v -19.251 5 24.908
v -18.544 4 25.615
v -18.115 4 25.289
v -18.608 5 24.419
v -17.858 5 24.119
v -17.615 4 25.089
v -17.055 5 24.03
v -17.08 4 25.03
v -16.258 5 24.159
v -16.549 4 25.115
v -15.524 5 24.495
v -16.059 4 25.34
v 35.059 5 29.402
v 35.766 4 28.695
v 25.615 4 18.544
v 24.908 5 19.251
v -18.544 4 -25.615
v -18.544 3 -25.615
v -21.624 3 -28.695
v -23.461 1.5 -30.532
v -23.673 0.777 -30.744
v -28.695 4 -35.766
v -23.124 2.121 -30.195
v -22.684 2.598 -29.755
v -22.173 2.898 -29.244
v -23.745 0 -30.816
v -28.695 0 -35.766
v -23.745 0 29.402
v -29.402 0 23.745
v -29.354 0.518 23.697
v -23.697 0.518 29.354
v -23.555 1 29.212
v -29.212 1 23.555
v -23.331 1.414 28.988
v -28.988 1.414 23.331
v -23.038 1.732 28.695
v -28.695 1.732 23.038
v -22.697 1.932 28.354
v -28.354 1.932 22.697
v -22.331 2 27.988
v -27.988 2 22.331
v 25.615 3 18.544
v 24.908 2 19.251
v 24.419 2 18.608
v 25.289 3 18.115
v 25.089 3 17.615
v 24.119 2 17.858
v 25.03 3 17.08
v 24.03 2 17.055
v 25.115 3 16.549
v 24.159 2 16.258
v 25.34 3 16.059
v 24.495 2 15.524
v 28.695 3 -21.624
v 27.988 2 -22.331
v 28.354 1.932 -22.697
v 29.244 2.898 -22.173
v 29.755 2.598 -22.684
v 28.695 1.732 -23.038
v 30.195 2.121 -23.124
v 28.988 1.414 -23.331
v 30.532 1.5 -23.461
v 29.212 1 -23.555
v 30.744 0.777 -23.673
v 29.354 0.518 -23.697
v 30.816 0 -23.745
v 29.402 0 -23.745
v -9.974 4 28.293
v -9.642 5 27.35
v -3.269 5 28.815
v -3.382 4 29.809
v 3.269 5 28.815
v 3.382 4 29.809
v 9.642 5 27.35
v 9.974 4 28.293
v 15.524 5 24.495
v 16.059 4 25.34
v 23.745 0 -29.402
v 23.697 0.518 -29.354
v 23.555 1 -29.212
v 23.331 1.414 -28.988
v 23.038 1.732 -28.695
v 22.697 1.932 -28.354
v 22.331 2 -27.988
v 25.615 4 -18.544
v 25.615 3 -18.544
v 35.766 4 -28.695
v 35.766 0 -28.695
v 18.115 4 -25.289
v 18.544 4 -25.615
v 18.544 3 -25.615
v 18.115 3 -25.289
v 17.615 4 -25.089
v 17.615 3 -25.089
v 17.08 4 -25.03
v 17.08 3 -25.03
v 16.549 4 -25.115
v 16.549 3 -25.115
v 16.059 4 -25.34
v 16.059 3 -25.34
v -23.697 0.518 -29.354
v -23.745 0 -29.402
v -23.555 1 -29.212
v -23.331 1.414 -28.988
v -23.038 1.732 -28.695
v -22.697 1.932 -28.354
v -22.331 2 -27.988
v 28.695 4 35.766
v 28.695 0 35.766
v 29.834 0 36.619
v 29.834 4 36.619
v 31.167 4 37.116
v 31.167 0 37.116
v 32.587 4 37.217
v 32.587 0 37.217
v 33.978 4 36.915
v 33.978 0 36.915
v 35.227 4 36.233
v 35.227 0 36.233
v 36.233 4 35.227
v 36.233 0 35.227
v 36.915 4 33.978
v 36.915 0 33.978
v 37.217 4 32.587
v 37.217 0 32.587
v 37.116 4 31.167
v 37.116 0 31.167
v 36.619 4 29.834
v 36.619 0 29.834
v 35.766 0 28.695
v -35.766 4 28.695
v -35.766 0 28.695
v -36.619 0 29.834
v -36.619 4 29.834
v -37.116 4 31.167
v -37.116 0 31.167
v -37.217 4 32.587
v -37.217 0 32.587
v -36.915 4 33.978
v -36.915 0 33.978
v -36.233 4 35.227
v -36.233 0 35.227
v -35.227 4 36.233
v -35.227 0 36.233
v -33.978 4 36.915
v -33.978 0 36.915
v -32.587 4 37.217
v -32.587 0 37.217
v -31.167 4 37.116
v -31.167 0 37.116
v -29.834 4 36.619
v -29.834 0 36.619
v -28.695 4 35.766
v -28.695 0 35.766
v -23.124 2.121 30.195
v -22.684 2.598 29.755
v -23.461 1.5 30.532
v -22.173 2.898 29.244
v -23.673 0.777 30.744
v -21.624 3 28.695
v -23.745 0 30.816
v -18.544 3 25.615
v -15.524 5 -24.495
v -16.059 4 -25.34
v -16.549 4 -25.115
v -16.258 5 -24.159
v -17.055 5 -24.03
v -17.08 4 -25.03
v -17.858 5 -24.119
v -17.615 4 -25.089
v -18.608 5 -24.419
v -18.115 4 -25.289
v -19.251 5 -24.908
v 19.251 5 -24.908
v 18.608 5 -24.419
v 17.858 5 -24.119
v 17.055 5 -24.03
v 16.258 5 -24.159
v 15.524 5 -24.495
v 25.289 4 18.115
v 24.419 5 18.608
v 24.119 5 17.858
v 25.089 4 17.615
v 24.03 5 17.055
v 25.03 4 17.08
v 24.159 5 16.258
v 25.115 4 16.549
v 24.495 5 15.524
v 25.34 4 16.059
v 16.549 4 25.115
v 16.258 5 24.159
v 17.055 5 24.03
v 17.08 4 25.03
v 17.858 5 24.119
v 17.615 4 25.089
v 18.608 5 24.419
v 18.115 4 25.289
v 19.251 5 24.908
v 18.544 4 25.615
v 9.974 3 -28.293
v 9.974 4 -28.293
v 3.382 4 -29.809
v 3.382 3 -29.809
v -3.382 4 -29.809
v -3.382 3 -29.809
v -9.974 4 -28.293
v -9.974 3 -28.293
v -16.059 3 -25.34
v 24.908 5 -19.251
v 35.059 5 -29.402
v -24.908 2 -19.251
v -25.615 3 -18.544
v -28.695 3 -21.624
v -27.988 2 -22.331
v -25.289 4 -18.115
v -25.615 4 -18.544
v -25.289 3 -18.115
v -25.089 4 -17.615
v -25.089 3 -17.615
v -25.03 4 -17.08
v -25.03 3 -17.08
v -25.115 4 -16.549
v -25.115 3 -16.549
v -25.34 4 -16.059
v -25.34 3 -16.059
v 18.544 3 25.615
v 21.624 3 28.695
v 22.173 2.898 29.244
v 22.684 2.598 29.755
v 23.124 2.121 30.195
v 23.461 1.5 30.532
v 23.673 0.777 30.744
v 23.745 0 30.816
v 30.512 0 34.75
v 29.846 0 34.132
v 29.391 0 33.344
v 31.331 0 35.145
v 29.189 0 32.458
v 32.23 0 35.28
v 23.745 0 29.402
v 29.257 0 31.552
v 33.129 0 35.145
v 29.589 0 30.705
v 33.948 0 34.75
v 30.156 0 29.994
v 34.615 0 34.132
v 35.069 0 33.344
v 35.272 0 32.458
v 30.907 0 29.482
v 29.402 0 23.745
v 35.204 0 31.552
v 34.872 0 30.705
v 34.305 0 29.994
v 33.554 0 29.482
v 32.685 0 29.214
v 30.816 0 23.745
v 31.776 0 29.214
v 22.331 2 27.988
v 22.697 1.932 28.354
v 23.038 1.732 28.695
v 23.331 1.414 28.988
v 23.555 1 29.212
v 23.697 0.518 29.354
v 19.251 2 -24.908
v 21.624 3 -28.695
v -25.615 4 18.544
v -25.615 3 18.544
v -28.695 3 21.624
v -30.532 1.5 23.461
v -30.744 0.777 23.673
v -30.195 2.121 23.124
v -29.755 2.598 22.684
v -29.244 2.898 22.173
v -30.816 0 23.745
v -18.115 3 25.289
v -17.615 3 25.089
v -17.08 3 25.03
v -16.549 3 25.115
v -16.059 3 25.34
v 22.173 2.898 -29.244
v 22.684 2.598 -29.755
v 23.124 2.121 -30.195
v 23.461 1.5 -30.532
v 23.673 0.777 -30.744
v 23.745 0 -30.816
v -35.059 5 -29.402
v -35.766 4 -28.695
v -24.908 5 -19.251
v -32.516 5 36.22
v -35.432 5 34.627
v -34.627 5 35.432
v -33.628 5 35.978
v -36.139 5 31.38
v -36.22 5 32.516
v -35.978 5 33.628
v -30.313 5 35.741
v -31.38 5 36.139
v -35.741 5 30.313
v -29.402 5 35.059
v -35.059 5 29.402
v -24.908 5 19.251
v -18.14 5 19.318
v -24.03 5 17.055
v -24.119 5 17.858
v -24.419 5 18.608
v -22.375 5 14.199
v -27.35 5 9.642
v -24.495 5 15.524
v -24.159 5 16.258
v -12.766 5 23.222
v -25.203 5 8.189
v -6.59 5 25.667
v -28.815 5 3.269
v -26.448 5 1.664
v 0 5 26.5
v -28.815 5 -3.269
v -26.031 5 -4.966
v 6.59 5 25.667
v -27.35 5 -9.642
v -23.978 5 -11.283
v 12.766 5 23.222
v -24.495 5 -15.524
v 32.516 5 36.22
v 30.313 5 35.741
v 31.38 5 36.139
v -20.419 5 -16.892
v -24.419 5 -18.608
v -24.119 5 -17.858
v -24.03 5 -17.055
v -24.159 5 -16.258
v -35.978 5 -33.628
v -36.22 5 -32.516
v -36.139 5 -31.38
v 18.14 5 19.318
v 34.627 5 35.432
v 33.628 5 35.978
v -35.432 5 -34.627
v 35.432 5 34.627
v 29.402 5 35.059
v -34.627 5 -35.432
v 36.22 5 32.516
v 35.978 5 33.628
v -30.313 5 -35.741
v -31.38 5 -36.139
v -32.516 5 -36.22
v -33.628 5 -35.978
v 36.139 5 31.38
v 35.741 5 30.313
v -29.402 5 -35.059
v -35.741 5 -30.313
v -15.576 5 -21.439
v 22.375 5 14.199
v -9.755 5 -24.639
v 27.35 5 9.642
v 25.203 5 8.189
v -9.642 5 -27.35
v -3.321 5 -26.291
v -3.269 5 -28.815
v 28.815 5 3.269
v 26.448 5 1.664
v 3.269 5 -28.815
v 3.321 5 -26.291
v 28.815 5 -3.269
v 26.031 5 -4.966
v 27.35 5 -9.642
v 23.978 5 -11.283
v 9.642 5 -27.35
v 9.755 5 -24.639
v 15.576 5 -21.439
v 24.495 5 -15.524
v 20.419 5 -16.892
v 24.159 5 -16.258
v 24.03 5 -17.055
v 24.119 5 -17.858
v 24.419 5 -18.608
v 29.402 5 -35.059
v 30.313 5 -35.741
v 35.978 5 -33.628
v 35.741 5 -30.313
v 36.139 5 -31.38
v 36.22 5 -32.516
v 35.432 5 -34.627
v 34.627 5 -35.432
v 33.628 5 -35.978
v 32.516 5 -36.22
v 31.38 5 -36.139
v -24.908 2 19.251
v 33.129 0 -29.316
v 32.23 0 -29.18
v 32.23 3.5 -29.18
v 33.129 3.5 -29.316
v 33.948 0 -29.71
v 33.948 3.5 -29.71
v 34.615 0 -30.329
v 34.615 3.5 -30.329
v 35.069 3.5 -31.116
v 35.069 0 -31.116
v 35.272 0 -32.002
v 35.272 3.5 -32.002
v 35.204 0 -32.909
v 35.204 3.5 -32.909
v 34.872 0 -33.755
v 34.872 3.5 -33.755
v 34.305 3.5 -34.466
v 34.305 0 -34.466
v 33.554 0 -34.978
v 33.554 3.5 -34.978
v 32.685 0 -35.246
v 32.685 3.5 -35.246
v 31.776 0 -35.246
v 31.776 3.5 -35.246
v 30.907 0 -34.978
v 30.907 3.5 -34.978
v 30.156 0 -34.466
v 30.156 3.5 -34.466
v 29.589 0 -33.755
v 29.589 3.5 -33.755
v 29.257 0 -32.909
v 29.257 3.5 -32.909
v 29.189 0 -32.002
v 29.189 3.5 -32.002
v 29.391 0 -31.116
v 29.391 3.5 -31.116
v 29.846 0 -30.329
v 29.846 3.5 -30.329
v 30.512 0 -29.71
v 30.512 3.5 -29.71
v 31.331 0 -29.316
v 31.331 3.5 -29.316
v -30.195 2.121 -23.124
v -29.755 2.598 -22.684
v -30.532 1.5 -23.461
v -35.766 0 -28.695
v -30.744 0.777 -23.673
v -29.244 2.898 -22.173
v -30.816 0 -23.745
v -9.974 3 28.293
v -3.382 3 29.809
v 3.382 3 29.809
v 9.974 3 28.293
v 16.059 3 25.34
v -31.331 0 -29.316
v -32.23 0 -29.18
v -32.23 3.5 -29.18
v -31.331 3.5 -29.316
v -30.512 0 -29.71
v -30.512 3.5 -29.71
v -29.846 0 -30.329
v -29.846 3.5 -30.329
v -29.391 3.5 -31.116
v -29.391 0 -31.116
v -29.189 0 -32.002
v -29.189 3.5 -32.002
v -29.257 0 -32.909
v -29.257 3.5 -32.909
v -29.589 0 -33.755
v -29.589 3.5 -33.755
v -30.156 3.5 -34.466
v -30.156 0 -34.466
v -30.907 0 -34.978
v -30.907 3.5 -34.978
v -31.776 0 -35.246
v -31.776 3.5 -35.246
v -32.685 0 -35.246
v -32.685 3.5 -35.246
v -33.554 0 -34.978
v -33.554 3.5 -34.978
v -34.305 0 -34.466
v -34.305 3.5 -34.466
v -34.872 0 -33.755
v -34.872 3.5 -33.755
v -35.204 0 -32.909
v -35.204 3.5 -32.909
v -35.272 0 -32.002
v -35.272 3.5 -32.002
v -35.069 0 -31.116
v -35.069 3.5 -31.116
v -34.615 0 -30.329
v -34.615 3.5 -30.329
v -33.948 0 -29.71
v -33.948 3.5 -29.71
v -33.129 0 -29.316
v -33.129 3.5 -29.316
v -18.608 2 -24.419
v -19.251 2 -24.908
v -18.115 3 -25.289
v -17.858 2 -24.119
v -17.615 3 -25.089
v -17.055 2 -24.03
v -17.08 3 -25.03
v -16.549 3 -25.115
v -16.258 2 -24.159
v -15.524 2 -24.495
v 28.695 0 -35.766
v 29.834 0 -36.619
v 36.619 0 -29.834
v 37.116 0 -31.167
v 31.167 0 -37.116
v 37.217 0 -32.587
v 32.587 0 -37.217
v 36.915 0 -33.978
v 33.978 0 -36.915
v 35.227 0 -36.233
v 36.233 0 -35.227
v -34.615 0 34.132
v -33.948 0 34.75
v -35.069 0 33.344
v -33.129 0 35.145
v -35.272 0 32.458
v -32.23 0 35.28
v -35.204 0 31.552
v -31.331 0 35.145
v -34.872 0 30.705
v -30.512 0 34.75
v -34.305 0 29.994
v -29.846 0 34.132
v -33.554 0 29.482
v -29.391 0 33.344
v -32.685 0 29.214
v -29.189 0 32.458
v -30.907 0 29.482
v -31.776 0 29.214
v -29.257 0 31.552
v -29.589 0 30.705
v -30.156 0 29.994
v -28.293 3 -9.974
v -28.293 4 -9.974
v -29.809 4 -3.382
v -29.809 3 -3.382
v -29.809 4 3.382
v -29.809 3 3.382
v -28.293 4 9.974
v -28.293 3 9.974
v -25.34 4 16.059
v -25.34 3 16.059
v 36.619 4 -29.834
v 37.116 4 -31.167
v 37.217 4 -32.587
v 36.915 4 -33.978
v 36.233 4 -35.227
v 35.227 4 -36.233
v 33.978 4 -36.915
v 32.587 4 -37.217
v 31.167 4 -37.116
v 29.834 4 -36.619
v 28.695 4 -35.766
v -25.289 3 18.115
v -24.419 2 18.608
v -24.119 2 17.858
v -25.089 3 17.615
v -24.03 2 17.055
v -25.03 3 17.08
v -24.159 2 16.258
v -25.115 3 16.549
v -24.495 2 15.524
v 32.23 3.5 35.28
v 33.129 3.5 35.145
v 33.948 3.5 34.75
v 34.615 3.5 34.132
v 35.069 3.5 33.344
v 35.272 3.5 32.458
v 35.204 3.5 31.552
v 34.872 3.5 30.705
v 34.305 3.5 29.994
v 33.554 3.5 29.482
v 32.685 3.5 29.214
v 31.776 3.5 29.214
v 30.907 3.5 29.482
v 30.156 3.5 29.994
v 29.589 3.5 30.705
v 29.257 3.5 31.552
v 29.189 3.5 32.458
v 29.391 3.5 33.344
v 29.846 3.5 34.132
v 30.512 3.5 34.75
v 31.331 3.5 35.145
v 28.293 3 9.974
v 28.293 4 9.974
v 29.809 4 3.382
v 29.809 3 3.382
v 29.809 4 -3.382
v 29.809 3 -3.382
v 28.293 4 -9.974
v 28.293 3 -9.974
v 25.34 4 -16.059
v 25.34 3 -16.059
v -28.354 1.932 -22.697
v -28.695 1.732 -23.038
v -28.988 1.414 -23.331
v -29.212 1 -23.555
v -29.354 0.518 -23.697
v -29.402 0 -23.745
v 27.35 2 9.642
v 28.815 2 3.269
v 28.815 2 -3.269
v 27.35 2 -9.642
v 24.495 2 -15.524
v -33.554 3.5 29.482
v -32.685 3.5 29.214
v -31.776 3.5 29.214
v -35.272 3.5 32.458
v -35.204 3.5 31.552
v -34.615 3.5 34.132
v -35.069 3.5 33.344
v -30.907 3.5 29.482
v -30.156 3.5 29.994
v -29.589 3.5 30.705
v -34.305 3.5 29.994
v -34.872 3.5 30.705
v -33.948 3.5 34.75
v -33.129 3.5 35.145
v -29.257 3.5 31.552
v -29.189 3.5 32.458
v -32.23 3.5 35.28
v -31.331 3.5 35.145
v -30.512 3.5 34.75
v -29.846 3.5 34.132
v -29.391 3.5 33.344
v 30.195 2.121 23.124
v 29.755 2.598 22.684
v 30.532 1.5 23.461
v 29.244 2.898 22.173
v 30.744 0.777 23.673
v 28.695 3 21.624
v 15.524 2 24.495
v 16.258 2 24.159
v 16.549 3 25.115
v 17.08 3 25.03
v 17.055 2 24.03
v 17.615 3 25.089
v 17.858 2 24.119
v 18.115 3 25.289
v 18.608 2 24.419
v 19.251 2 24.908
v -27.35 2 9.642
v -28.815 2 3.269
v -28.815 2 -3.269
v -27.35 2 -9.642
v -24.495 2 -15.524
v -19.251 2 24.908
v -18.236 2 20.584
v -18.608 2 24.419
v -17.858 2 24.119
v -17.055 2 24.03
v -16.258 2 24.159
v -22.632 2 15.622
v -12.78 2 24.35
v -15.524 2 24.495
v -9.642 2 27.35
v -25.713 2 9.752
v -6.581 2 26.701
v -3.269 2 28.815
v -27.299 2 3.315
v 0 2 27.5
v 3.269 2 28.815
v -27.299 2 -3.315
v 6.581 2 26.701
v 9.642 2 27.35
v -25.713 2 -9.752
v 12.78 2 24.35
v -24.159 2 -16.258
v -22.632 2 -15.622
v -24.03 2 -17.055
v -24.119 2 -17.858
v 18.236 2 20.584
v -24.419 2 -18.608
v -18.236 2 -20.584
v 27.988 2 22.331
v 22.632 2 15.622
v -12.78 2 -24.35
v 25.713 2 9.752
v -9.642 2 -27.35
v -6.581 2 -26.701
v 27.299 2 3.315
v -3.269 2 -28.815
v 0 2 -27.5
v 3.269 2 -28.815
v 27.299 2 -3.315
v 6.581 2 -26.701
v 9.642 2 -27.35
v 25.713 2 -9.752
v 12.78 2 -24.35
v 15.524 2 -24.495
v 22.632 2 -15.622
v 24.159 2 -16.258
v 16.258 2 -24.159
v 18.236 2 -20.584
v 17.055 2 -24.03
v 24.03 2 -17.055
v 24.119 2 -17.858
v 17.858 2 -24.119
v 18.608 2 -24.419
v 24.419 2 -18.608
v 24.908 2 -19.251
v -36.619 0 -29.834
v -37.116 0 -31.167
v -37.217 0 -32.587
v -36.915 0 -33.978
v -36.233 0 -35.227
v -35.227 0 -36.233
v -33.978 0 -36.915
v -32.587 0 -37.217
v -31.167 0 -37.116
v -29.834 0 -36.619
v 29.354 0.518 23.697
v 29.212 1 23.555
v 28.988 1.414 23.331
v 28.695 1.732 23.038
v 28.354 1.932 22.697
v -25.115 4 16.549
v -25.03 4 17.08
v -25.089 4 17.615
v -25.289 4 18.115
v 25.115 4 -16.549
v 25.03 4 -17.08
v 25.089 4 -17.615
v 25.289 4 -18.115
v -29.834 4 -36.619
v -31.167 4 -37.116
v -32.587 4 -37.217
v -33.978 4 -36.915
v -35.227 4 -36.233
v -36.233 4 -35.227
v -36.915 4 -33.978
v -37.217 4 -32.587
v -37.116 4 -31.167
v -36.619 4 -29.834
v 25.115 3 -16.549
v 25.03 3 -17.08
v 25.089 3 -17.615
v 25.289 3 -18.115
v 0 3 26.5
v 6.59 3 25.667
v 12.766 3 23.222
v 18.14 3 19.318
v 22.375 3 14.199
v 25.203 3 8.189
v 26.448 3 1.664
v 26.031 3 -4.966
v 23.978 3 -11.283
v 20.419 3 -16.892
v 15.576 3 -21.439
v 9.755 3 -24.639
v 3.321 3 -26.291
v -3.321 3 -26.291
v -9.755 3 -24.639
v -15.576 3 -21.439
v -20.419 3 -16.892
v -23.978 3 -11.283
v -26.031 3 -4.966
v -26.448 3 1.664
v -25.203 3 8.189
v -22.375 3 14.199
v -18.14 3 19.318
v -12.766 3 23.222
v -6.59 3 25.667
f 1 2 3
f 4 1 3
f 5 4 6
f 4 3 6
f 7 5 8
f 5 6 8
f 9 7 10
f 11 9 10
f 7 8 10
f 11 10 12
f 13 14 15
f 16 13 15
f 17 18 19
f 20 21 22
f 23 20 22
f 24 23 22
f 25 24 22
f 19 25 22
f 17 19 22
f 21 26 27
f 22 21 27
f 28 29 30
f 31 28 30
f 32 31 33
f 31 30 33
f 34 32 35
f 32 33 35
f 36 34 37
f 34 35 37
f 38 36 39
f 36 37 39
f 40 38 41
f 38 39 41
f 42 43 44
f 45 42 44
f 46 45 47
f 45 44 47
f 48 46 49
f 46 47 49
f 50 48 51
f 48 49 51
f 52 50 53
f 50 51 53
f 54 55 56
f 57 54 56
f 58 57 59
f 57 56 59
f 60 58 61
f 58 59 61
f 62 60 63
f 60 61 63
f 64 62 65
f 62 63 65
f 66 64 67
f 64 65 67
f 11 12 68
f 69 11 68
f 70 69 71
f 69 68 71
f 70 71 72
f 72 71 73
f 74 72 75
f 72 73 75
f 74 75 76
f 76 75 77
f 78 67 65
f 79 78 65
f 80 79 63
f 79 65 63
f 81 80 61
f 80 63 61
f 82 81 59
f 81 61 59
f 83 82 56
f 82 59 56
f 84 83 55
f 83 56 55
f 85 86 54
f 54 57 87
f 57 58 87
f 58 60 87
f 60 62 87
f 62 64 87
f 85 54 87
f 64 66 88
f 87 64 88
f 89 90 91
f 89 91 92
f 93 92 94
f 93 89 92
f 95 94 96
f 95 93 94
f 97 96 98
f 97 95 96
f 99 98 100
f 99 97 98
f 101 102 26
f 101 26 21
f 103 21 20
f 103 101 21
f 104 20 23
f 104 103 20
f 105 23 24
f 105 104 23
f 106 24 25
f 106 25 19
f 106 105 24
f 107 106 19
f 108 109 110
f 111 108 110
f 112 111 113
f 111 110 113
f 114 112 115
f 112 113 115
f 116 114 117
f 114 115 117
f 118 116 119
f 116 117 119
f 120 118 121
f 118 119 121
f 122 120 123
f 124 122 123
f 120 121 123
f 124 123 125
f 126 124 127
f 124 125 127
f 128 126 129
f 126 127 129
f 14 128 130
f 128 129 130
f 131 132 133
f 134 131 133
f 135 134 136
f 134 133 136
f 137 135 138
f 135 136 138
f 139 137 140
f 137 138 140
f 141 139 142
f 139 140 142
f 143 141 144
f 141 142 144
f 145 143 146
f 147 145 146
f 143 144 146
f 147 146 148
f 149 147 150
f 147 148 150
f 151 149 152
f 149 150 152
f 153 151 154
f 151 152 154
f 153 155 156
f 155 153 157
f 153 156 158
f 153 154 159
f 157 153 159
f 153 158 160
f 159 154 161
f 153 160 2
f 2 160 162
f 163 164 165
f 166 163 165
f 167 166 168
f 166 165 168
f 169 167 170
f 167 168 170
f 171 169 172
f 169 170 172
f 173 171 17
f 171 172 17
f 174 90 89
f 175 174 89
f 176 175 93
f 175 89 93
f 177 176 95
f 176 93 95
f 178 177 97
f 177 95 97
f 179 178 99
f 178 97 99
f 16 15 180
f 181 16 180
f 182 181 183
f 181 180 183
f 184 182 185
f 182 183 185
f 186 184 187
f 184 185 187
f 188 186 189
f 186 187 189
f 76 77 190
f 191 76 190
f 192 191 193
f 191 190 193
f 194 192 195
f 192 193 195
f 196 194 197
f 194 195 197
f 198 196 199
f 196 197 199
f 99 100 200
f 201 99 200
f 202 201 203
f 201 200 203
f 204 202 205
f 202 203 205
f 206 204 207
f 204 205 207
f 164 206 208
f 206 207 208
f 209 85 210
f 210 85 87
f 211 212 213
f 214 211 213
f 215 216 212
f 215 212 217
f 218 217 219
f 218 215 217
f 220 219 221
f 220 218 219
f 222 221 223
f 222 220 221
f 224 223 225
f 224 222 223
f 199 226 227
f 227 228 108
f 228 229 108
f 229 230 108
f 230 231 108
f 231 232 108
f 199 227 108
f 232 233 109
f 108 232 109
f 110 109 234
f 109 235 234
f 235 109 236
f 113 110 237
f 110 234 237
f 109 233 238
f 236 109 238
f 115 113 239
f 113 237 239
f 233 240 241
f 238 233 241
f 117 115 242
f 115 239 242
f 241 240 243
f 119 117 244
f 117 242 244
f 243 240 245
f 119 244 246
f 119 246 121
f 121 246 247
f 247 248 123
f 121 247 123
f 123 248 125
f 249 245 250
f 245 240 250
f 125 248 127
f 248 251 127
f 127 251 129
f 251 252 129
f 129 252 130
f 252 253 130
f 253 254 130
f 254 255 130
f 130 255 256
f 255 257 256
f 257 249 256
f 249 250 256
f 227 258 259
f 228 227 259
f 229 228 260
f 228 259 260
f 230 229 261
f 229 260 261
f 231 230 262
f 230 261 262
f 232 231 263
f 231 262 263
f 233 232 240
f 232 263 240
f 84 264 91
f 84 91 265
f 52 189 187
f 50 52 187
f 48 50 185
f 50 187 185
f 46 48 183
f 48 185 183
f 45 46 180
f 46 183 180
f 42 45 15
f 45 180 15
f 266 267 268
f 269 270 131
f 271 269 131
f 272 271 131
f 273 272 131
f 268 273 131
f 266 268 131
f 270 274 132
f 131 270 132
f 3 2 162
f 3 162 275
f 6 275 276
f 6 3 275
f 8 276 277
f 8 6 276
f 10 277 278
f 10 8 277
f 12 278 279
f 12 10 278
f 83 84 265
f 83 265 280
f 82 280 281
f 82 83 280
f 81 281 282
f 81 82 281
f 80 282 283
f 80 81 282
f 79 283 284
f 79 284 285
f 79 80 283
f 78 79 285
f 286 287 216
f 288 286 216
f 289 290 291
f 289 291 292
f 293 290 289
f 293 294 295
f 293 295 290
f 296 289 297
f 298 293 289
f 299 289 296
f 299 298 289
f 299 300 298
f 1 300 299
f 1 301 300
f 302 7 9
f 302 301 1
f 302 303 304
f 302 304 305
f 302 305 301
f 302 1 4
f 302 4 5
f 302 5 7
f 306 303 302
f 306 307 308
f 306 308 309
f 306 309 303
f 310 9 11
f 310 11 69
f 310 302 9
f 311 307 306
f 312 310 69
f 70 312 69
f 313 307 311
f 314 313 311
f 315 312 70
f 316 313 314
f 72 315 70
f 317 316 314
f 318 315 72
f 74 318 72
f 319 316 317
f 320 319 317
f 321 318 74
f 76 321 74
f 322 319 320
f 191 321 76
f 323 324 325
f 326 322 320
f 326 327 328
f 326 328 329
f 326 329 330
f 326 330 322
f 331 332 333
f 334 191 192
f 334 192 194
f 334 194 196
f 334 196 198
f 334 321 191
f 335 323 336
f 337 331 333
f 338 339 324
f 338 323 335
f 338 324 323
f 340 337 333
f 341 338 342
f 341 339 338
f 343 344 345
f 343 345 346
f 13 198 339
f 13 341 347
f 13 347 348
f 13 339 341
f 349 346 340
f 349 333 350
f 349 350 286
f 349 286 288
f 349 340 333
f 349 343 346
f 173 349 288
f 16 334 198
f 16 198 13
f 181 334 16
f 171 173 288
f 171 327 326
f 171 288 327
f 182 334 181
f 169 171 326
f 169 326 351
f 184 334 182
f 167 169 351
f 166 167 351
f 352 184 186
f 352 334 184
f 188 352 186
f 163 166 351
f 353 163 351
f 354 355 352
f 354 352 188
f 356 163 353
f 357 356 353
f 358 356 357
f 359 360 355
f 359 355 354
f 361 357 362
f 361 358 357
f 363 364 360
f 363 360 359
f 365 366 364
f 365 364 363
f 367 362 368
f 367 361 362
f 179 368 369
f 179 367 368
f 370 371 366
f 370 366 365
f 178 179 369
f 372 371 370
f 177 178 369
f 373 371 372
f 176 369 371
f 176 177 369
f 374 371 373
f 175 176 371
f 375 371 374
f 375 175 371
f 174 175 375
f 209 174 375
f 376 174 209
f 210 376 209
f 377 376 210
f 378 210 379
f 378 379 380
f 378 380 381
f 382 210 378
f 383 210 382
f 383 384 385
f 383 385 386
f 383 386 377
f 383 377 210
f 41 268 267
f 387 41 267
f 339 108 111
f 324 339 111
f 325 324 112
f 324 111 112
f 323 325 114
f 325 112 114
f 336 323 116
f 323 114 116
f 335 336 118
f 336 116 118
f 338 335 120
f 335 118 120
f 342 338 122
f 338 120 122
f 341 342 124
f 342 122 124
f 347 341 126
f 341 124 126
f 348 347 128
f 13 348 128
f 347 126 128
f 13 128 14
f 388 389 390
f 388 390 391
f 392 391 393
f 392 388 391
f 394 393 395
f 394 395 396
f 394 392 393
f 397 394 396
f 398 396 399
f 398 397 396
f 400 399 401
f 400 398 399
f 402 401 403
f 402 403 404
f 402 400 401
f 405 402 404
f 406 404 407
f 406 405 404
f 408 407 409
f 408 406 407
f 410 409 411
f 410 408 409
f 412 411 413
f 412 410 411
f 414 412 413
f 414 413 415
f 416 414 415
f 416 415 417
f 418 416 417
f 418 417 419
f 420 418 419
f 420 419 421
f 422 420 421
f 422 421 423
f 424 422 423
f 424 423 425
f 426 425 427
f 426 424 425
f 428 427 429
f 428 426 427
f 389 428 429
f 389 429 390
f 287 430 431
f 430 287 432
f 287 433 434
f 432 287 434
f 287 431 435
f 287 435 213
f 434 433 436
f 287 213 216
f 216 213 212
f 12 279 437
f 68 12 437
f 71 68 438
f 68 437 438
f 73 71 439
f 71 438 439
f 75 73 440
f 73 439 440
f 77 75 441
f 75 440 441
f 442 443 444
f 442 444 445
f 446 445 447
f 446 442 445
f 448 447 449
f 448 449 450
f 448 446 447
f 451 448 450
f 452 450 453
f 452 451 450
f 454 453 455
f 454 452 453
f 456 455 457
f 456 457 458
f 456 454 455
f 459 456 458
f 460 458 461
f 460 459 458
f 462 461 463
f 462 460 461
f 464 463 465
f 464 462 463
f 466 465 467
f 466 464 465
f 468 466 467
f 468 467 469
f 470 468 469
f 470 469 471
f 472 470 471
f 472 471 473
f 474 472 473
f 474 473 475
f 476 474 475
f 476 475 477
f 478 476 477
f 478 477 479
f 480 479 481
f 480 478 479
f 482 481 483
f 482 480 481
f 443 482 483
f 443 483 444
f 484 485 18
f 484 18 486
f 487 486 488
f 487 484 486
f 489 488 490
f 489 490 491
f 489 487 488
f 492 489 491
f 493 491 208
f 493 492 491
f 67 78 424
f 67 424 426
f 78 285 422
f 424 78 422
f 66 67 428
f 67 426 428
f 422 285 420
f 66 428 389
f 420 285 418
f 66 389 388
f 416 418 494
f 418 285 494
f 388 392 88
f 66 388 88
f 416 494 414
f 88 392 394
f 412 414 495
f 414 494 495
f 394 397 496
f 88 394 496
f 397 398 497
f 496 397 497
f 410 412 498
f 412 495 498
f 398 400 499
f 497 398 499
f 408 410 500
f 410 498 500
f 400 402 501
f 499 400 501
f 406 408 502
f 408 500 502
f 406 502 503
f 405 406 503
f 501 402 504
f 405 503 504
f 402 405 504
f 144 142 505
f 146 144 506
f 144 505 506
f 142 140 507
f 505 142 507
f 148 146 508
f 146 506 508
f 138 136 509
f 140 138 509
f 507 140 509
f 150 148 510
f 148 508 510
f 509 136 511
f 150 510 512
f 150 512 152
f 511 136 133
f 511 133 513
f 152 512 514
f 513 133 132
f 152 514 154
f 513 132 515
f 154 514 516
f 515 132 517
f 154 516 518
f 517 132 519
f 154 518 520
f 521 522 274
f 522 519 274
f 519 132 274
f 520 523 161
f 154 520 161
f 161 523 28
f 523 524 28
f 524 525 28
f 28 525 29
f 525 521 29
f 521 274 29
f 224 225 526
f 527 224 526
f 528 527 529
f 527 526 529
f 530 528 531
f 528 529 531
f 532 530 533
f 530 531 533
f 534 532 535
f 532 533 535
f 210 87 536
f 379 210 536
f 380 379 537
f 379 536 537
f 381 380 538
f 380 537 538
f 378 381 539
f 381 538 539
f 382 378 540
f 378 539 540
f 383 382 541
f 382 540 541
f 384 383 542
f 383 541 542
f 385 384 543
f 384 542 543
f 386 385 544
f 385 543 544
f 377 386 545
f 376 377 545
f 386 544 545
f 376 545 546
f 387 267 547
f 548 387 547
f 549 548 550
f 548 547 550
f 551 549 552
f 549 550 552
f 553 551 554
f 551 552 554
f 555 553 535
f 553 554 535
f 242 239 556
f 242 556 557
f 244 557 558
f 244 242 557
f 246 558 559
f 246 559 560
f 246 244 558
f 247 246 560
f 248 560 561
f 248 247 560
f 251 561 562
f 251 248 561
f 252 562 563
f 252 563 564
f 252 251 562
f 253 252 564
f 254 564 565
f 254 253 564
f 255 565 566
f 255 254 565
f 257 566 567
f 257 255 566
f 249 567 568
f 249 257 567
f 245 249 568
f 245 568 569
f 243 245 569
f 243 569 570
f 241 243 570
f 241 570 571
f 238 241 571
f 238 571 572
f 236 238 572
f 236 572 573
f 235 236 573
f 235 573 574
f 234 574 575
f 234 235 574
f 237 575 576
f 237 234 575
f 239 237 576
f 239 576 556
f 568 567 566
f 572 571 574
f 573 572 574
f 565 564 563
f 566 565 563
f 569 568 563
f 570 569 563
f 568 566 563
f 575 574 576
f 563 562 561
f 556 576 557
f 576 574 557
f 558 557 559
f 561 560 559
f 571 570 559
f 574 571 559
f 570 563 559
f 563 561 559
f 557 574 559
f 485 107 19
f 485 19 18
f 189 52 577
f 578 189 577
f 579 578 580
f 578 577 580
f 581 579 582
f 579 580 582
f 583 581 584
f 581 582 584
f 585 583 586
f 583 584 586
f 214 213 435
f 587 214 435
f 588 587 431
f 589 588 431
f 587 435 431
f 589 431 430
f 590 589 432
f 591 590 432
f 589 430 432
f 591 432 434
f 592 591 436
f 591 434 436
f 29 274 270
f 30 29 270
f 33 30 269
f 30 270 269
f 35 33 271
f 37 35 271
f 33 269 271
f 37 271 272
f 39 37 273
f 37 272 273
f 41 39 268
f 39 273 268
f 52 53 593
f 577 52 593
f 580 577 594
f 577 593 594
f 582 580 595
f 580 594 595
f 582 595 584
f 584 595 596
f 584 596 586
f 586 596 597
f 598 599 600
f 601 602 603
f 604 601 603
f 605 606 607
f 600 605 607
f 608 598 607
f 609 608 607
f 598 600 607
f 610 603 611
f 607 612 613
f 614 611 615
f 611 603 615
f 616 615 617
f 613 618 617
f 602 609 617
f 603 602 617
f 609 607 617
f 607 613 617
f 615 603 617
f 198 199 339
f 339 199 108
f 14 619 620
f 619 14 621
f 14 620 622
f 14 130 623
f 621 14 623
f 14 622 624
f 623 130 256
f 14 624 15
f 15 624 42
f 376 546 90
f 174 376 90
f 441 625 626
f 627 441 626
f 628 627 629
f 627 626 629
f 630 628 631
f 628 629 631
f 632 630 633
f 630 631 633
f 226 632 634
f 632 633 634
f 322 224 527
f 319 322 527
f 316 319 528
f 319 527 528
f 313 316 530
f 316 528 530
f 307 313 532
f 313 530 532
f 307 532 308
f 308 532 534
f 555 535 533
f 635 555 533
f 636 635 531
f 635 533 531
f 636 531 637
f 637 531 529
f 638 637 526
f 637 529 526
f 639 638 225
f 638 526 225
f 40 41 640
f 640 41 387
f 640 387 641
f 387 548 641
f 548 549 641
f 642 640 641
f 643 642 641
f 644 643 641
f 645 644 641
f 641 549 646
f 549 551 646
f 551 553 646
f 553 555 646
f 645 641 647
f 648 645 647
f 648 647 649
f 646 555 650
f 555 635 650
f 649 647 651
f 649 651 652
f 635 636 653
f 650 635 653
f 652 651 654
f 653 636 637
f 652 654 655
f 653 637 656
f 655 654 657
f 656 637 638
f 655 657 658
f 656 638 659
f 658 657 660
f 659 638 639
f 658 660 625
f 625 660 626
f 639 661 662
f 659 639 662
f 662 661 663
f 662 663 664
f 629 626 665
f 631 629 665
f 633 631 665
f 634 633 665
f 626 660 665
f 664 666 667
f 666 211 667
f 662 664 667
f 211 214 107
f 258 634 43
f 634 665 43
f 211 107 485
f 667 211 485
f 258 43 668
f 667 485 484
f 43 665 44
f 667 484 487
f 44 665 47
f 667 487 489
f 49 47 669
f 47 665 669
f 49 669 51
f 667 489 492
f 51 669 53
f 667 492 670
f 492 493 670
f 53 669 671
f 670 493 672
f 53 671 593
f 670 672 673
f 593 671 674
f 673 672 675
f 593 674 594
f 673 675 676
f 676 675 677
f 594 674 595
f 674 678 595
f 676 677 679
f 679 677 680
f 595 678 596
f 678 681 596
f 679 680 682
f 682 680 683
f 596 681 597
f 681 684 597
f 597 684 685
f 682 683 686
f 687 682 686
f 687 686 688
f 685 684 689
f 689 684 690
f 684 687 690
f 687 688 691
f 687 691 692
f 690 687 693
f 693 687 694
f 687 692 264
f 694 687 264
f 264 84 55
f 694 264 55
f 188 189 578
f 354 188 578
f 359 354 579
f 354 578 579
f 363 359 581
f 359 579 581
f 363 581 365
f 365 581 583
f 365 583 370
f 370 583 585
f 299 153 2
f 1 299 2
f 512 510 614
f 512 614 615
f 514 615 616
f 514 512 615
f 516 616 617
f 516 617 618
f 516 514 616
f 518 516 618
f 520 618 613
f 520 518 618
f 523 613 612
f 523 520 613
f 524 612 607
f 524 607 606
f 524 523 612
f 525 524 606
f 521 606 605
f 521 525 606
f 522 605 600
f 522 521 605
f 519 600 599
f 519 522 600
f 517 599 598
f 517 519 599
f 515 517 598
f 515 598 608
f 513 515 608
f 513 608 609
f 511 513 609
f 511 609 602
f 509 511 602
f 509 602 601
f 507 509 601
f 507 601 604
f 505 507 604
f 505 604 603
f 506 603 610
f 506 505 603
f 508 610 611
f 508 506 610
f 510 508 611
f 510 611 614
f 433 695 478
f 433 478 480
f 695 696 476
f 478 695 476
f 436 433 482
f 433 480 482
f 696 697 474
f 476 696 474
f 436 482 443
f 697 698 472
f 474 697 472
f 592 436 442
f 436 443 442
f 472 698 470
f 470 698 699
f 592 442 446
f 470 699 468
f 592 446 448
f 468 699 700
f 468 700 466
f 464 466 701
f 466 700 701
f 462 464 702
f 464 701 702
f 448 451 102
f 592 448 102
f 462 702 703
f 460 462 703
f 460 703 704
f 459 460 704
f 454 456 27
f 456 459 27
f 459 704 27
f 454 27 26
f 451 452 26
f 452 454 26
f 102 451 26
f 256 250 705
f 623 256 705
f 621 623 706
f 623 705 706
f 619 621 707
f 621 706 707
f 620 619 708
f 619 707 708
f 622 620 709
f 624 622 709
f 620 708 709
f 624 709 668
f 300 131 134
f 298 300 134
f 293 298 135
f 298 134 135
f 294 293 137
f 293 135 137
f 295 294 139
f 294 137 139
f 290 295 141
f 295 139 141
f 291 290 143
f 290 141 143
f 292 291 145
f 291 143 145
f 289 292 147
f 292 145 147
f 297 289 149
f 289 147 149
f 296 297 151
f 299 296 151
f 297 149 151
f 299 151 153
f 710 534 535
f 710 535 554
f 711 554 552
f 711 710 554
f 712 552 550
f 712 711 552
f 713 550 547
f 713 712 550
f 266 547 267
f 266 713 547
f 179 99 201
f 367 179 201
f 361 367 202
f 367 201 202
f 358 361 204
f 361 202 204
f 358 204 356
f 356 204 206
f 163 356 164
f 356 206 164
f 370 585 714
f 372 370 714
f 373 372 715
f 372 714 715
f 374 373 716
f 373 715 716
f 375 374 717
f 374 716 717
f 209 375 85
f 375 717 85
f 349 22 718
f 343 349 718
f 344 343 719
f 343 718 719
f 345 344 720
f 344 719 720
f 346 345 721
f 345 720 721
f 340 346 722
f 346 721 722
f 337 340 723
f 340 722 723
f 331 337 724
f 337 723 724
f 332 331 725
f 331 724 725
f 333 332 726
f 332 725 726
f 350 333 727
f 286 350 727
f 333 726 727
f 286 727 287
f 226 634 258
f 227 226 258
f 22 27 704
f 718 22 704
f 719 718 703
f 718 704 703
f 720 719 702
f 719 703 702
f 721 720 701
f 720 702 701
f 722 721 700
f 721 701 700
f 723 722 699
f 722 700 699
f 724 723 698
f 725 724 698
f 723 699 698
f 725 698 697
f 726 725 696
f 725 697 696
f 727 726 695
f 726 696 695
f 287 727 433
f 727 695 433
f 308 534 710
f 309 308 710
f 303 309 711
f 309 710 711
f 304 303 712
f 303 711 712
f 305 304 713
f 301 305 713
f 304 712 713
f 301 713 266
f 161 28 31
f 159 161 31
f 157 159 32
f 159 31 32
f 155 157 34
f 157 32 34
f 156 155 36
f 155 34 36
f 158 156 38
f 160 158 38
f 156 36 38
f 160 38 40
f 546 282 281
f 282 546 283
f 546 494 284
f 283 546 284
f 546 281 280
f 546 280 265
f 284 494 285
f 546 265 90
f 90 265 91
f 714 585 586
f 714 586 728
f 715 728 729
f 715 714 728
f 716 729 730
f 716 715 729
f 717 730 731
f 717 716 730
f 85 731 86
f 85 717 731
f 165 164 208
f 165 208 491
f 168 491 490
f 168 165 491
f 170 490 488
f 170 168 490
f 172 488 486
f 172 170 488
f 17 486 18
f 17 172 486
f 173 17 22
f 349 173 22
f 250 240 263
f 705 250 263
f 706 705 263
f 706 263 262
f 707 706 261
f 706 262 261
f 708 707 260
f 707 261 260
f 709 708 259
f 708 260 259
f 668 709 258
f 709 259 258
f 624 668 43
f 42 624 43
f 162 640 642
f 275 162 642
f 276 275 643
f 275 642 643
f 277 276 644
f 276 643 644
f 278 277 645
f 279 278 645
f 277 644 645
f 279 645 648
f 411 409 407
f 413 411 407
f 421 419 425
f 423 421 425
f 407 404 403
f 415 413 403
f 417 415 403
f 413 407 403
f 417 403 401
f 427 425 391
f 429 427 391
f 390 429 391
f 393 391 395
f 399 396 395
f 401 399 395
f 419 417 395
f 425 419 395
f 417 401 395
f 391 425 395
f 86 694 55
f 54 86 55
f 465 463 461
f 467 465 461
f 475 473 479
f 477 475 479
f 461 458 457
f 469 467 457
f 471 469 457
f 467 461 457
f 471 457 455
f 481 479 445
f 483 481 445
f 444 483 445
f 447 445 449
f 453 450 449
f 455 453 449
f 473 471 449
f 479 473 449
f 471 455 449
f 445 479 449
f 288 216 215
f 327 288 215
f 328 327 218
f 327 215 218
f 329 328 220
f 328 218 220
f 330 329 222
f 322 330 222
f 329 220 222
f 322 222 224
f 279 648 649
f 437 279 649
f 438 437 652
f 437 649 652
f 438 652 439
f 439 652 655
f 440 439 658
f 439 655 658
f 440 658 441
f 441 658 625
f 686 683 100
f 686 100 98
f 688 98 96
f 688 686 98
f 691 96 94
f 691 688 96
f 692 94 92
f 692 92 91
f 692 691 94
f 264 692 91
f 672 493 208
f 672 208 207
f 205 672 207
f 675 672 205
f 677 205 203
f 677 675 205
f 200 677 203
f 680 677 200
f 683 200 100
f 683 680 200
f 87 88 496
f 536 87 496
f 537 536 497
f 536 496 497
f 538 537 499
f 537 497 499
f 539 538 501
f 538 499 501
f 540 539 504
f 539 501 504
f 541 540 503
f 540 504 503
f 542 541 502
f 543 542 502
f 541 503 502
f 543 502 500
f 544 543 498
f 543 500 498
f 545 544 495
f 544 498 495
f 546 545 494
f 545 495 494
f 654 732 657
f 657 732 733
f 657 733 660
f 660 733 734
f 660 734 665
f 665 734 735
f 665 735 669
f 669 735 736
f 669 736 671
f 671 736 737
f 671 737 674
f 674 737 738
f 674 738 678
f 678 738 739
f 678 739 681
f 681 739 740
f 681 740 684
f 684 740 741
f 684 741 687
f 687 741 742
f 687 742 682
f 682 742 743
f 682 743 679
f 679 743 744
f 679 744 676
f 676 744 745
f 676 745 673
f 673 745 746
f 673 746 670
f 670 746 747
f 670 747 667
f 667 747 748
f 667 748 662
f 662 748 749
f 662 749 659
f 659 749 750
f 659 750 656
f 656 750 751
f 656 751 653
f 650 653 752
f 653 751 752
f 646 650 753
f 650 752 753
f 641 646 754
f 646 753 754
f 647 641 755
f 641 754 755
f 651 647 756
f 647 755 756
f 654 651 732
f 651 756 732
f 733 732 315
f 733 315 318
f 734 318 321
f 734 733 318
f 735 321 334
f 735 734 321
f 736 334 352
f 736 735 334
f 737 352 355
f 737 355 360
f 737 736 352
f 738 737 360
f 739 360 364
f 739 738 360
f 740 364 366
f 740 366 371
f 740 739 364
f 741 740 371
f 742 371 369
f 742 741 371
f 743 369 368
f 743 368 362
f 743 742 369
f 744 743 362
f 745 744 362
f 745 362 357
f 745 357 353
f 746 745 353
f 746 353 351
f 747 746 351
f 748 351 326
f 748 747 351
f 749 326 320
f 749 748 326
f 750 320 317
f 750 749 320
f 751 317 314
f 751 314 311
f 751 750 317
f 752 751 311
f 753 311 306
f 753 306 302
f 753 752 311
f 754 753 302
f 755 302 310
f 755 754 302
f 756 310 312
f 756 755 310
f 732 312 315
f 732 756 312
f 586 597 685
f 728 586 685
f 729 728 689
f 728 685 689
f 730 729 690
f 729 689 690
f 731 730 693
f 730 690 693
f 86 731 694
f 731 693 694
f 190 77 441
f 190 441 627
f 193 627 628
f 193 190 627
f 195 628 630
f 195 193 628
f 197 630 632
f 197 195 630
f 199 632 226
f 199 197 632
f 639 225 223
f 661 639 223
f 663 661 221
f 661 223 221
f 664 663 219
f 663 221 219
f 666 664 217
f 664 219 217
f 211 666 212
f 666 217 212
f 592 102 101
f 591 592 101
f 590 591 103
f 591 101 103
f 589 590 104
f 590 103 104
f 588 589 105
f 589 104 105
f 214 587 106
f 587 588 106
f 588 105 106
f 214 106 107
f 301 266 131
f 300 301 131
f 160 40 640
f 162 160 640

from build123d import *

# Parameters (mm, degrees)
BASE_R              = 3.05
BOSS_EXTRUDE1_DEPTH = 2
BOSS_EXTRUDE2_START = 2
BASE_3_R            = 30
BASE_3_R_2          = 26.5
BASE_3_R_3          = 3.05
BOSS_EXTRUDE2_DEPTH = 3
FILLET1_R           = 2
CHAMFER1_SIZE       = 1
BASE_4_R            = 3.05
CUT_EXTRUDE1_DEPTH  = 3.5


with BuildPart() as part:
    # Base → Boss-Extrude1 (new body)
    # profile 1 of 8: a face of its own
    with BuildSketch(Plane(origin=(0, 0, 0), x_dir=(1, 0, 0), z_dir=(0, 1, 0))):
        with BuildLine():
            Line((-23.037821007, -30.108888819), (-30.108888819, -23.037821007))
            Line((-30.108888819, -23.037821007), (-35.765743068, -28.694675256))
            ThreePointArc((-35.765743068, -28.694675256), (-35.765743068, -35.765743068), (-28.694675256, -35.765743068))
            Line((-28.694675256, -35.765743068), (-23.037821007, -30.108888819))
        make_face()
        with Locations((-32.230209162, -32.230209162)):
            Circle(BASE_R, mode=Mode.SUBTRACT)
    # profile 2 of 8: a face of its own
    with BuildSketch(Plane(origin=(0, 0, 0), x_dir=(1, 0, 0), z_dir=(0, 1, 0))):
        with BuildLine():
            Line((35.765743068, -28.694675256), (30.108888819, -23.037821007))
            Line((30.108888819, -23.037821007), (23.037821007, -30.108888819))
            Line((23.037821007, -30.108888819), (28.694675256, -35.765743068))
            ThreePointArc((28.694675256, -35.765743068), (35.765743068, -35.765743068), (35.765743068, -28.694675256))
        make_face()
        with Locations((32.230209162, -32.230209162)):
            Circle(BASE_R, mode=Mode.SUBTRACT)
    # profile 3 of 8: a face of its own
    with BuildSketch(Plane(origin=(0, 0, 0), x_dir=(1, 0, 0), z_dir=(0, 1, 0))):
        with BuildLine():
            Line((28.694675256, 35.765743068), (23.037821007, 30.108888819))
            Line((23.037821007, 30.108888819), (30.108888819, 23.037821007))
            Line((30.108888819, 23.037821007), (35.765743068, 28.694675256))
            ThreePointArc((35.765743068, 28.694675256), (35.765743068, 35.765743068), (28.694675256, 35.765743068))
        make_face()
        with Locations((32.230209162, 32.230209162)):
            Circle(BASE_R, mode=Mode.SUBTRACT)
    # profile 4 of 8: a face of its own
    with BuildSketch(Plane(origin=(0, 0, 0), x_dir=(1, 0, 0), z_dir=(0, 1, 0))):
        with BuildLine():
            Line((-23.037821007, 30.108888819), (-28.694675256, 35.765743068))
            ThreePointArc((-28.694675256, 35.765743068), (-35.765743068, 35.765743068), (-35.765743068, 28.694675256))
            Line((-35.765743068, 28.694675256), (-30.108888819, 23.037821007))
            Line((-30.108888819, 23.037821007), (-23.037821007, 30.108888819))
        make_face()
        with Locations((-32.230209162, 32.230209162)):
            Circle(BASE_R, mode=Mode.SUBTRACT)
    # profile 5 of 8: a face of its own
    with BuildSketch(Plane(origin=(0, 0, 0), x_dir=(1, 0, 0), z_dir=(0, 1, 0))):
        with Locations((32.230209162, 32.230209162)):
            Circle(BASE_R)
    # profile 6 of 8: a face of its own
    with BuildSketch(Plane(origin=(0, 0, 0), x_dir=(1, 0, 0), z_dir=(0, 1, 0))):
        with Locations((-32.230209162, 32.230209162)):
            Circle(BASE_R)
    # profile 7 of 8: a face of its own
    with BuildSketch(Plane(origin=(0, 0, 0), x_dir=(1, 0, 0), z_dir=(0, 1, 0))):
        with Locations((-32.230209162, -32.230209162)):
            Circle(BASE_R)
    # profile 8 of 8: a face of its own
    with BuildSketch(Plane(origin=(0, 0, 0), x_dir=(1, 0, 0), z_dir=(0, 1, 0))):
        with Locations((32.230209162, -32.230209162)):
            Circle(BASE_R)
    extrude(amount=BOSS_EXTRUDE1_DEPTH)

    # Base<3> → Boss-Extrude2 (add)
    # profile 1 of 13: a face of its own
    with BuildSketch(Plane(origin=(0, 0, 0), x_dir=(1, 0, 0), z_dir=(0, 1, 0)).offset(BOSS_EXTRUDE2_START)):
        Circle(BASE_3_R)
        with Locations(Location((0, 0, 0), (0, 0, 270))):
            Circle(BASE_3_R_2, mode=Mode.SUBTRACT)
    # profile 2 of 13: a face of its own
    with BuildSketch(Plane(origin=(0, 0, 0), x_dir=(1, 0, 0), z_dir=(0, 1, 0)).offset(BOSS_EXTRUDE2_START)):
        with BuildLine():
            ThreePointArc((-17.380966757, -24.452034569), (-21.213203436, -21.213203436), (-24.452034569, -17.380966757))
            Line((-24.452034569, -17.380966757), (-30.108888819, -23.037821007))
            Line((-30.108888819, -23.037821007), (-23.037821007, -30.108888819))
            Line((-23.037821007, -30.108888819), (-17.380966757, -24.452034569))
        make_face()
    # profile 3 of 13: a face of its own
    with BuildSketch(Plane(origin=(0, 0, 0), x_dir=(1, 0, 0), z_dir=(0, 1, 0)).offset(BOSS_EXTRUDE2_START)):
        with BuildLine():
            Line((-23.037821007, -30.108888819), (-30.108888819, -23.037821007))
            Line((-30.108888819, -23.037821007), (-35.765743068, -28.694675256))
            ThreePointArc((-35.765743068, -28.694675256), (-35.765743068, -35.765743068), (-28.694675256, -35.765743068))
            Line((-28.694675256, -35.765743068), (-23.037821007, -30.108888819))
        make_face()
        with Locations((-32.230209162, -32.230209162)):
            Circle(BASE_3_R_3, mode=Mode.SUBTRACT)
    # profile 4 of 13: a face of its own
    with BuildSketch(Plane(origin=(0, 0, 0), x_dir=(1, 0, 0), z_dir=(0, 1, 0)).offset(BOSS_EXTRUDE2_START)):
        with BuildLine():
            Line((30.108888819, -23.037821007), (24.452034569, -17.380966757))
            ThreePointArc((24.452034569, -17.380966757), (21.213203436, -21.213203436), (17.380966757, -24.452034569))
            Line((17.380966757, -24.452034569), (23.037821007, -30.108888819))
            Line((23.037821007, -30.108888819), (30.108888819, -23.037821007))
        make_face()
    # profile 5 of 13: a face of its own
    with BuildSketch(Plane(origin=(0, 0, 0), x_dir=(1, 0, 0), z_dir=(0, 1, 0)).offset(BOSS_EXTRUDE2_START)):
        with BuildLine():
            Line((35.765743068, -28.694675256), (30.108888819, -23.037821007))
            Line((30.108888819, -23.037821007), (23.037821007, -30.108888819))
            Line((23.037821007, -30.108888819), (28.694675256, -35.765743068))
            ThreePointArc((28.694675256, -35.765743068), (35.765743068, -35.765743068), (35.765743068, -28.694675256))
        make_face()
        with Locations((32.230209162, -32.230209162)):
            Circle(BASE_3_R_3, mode=Mode.SUBTRACT)
    # profile 6 of 13: a face of its own
    with BuildSketch(Plane(origin=(0, 0, 0), x_dir=(1, 0, 0), z_dir=(0, 1, 0)).offset(BOSS_EXTRUDE2_START)):
        with BuildLine():
            Line((23.037821007, 30.108888819), (17.380966757, 24.452034569))
            ThreePointArc((17.380966757, 24.452034569), (21.213203436, 21.213203436), (24.452034569, 17.380966757))
            Line((24.452034569, 17.380966757), (30.108888819, 23.037821007))
            Line((30.108888819, 23.037821007), (23.037821007, 30.108888819))
        make_face()
    # profile 7 of 13: a face of its own
    with BuildSketch(Plane(origin=(0, 0, 0), x_dir=(1, 0, 0), z_dir=(0, 1, 0)).offset(BOSS_EXTRUDE2_START)):
        with BuildLine():
            Line((28.694675256, 35.765743068), (23.037821007, 30.108888819))
            Line((23.037821007, 30.108888819), (30.108888819, 23.037821007))
            Line((30.108888819, 23.037821007), (35.765743068, 28.694675256))
            ThreePointArc((35.765743068, 28.694675256), (35.765743068, 35.765743068), (28.694675256, 35.765743068))
        make_face()
        with Locations((32.230209162, 32.230209162)):
            Circle(BASE_3_R_3, mode=Mode.SUBTRACT)
    # profile 8 of 13: a face of its own
    with BuildSketch(Plane(origin=(0, 0, 0), x_dir=(1, 0, 0), z_dir=(0, 1, 0)).offset(BOSS_EXTRUDE2_START)):
        with BuildLine():
            Line((-17.380966757, 24.452034569), (-23.037821007, 30.108888819))
            Line((-23.037821007, 30.108888819), (-30.108888819, 23.037821007))
            Line((-30.108888819, 23.037821007), (-24.452034569, 17.380966757))
            ThreePointArc((-24.452034569, 17.380966757), (-21.213203436, 21.213203436), (-17.380966757, 24.452034569))
        make_face()
    # profile 9 of 13: a face of its own
    with BuildSketch(Plane(origin=(0, 0, 0), x_dir=(1, 0, 0), z_dir=(0, 1, 0)).offset(BOSS_EXTRUDE2_START)):
        with BuildLine():
            Line((-23.037821007, 30.108888819), (-28.694675256, 35.765743068))
            ThreePointArc((-28.694675256, 35.765743068), (-35.765743068, 35.765743068), (-35.765743068, 28.694675256))
            Line((-35.765743068, 28.694675256), (-30.108888819, 23.037821007))
            Line((-30.108888819, 23.037821007), (-23.037821007, 30.108888819))
        make_face()
        with Locations((-32.230209162, 32.230209162)):
            Circle(BASE_3_R_3, mode=Mode.SUBTRACT)
    # profile 10 of 13: a face of its own
    with BuildSketch(Plane(origin=(0, 0, 0), x_dir=(1, 0, 0), z_dir=(0, 1, 0)).offset(BOSS_EXTRUDE2_START)):
        with Locations((-32.230209162, 32.230209162)):
            Circle(BASE_3_R_3)
    # profile 11 of 13: a face of its own
    with BuildSketch(Plane(origin=(0, 0, 0), x_dir=(1, 0, 0), z_dir=(0, 1, 0)).offset(BOSS_EXTRUDE2_START)):
        with Locations((-32.230209162, -32.230209162)):
            Circle(BASE_3_R_3)
    # profile 12 of 13: a face of its own
    with BuildSketch(Plane(origin=(0, 0, 0), x_dir=(1, 0, 0), z_dir=(0, 1, 0)).offset(BOSS_EXTRUDE2_START)):
        with Locations((32.230209162, -32.230209162)):
            Circle(BASE_3_R_3)
    # profile 13 of 13: a face of its own
    with BuildSketch(Plane(origin=(0, 0, 0), x_dir=(1, 0, 0), z_dir=(0, 1, 0)).offset(BOSS_EXTRUDE2_START)):
        with Locations((32.230209162, 32.230209162)):
            Circle(BASE_3_R_3)
    extrude(amount=BOSS_EXTRUDE2_DEPTH)

    # Fillet1
    fillet1_edges = [part.edges().sort_by_distance(p)[0] for p in [
        (24.452034569, 3.5, 17.380966757),
        (-17.380966757, 3.5, -24.452034569),
        (24.452034569, 3.5, -17.380966757),
        (-17.380966757, 3.5, 24.452034569),
        (17.380966757, 3.5, -24.452034569),
        (-24.452034569, 3.5, 17.380966757),
        (17.380966757, 3.5, 24.452034569),
        (-24.452034569, 3.5, -17.380966757),
        (-26.573354913, 2, 26.573354913),
        (-26.573354913, 2, -26.573354913),
        (26.573354913, 2, 26.573354913),
        (26.573354913, 2, -26.573354913),
    ]]
    fillet(fillet1_edges, radius=FILLET1_R - 0.0001)  # a hair under: the kernel refuses the full size

    # Chamfer1
    chamfer1_edges = [part.edges().sort_by_distance(p)[0] for p in [
        (23.619243451, 5, 30.690311263),
        (0, 5, 30),
        (-23.619243451, 5, 30.690311263),
        (-30.690311263, 5, 23.619243451),
        (-30, 5, 0),
        (-30.690311263, 5, -23.619243451),
        (-23.619243451, 5, -30.690311263),
        (0, 5, -30),
        (30.690311263, 5, -23.619243451),
        (30, 5, 0),
        (30.690311263, 5, 23.619243451),
        (23.619243451, 5, -30.690311263),
        (-29.694695967, 1.414242852, 22.623628155),
        (-22.623628155, 1.414242852, 29.694695967),
        (-22.623628155, 1.414242852, -29.694695967),
        (-29.694695967, 1.414242852, -22.623628155),
        (22.623628155, 1.414242852, 29.694695967),
        (29.694695967, 1.414242852, 22.623628155),
        (29.694695967, 1.414242852, -22.623628155),
        (22.623628155, 1.414242852, -29.694695967),
        (17.349741935, 2, 25.041267842),
        (17.349741935, 5, 25.041267842),
        (-17.349741935, 2, 25.041267842),
        (-17.349741935, 5, 25.041267842),
        (-25.041267842, 2, 17.349741935),
        (-25.041267842, 5, 17.349741935),
        (-25.041267842, 2, -17.349741935),
        (-25.041267842, 5, -17.349741935),
        (-17.349741935, 2, -25.041267842),
        (-17.349741935, 5, -25.041267842),
        (25.041267842, 2, -17.349741935),
        (25.041267842, 5, -17.349741935),
        (25.041267842, 2, 17.349741935),
        (25.041267842, 5, 17.349741935),
        (17.349741935, 2, -25.041267842),
        (17.349741935, 5, -25.041267842),
        (0, 2, -26.5),
        (35.765743068, 5, 35.765743068),
        (35.765743068, 5, -35.765743068),
        (-35.765743068, 5, -35.765743068),
        (-35.765743068, 5, 35.765743068),
        (-20.083744901, 2, -27.154812712),
        (0, 2, -30),
        (20.083744901, 2, -27.154812712),
        (27.154812712, 2, -20.083744901),
        (30, 2, 0),
        (27.154812712, 2, 20.083744901),
        (20.083744901, 2, 27.154812712),
        (0, 2, 30),
        (-20.083744901, 2, 27.154812712),
        (-27.154812712, 2, 20.083744901),
        (-30, 2, 0),
        (-27.154812712, 2, -20.083744901),
    ]]
    chamfer(chamfer1_edges, length=CHAMFER1_SIZE)

    # Base<4> → Cut-Extrude1 (cut)
    with BuildSketch(Plane(origin=(0, 0, 0), x_dir=(1, 0, 0), z_dir=(0, 1, 0))):
        with Locations(Location((32.230209162, -32.230209162, 0), (0, 0, 270))):
            Circle(BASE_4_R)
        with Locations(Location((-32.230209162, -32.230209162, 0), (0, 0, 270))):
            Circle(BASE_4_R)
        with Locations(Location((-32.230209162, 32.230209162, 0), (0, 0, 270))):
            Circle(BASE_4_R)
        with Locations(Location((32.230209162, 32.230209162, 0), (0, 0, 270))):
            Circle(BASE_4_R)
    extrude(amount=CUT_EXTRUDE1_DEPTH, mode=Mode.SUBTRACT)


solid = part.part
